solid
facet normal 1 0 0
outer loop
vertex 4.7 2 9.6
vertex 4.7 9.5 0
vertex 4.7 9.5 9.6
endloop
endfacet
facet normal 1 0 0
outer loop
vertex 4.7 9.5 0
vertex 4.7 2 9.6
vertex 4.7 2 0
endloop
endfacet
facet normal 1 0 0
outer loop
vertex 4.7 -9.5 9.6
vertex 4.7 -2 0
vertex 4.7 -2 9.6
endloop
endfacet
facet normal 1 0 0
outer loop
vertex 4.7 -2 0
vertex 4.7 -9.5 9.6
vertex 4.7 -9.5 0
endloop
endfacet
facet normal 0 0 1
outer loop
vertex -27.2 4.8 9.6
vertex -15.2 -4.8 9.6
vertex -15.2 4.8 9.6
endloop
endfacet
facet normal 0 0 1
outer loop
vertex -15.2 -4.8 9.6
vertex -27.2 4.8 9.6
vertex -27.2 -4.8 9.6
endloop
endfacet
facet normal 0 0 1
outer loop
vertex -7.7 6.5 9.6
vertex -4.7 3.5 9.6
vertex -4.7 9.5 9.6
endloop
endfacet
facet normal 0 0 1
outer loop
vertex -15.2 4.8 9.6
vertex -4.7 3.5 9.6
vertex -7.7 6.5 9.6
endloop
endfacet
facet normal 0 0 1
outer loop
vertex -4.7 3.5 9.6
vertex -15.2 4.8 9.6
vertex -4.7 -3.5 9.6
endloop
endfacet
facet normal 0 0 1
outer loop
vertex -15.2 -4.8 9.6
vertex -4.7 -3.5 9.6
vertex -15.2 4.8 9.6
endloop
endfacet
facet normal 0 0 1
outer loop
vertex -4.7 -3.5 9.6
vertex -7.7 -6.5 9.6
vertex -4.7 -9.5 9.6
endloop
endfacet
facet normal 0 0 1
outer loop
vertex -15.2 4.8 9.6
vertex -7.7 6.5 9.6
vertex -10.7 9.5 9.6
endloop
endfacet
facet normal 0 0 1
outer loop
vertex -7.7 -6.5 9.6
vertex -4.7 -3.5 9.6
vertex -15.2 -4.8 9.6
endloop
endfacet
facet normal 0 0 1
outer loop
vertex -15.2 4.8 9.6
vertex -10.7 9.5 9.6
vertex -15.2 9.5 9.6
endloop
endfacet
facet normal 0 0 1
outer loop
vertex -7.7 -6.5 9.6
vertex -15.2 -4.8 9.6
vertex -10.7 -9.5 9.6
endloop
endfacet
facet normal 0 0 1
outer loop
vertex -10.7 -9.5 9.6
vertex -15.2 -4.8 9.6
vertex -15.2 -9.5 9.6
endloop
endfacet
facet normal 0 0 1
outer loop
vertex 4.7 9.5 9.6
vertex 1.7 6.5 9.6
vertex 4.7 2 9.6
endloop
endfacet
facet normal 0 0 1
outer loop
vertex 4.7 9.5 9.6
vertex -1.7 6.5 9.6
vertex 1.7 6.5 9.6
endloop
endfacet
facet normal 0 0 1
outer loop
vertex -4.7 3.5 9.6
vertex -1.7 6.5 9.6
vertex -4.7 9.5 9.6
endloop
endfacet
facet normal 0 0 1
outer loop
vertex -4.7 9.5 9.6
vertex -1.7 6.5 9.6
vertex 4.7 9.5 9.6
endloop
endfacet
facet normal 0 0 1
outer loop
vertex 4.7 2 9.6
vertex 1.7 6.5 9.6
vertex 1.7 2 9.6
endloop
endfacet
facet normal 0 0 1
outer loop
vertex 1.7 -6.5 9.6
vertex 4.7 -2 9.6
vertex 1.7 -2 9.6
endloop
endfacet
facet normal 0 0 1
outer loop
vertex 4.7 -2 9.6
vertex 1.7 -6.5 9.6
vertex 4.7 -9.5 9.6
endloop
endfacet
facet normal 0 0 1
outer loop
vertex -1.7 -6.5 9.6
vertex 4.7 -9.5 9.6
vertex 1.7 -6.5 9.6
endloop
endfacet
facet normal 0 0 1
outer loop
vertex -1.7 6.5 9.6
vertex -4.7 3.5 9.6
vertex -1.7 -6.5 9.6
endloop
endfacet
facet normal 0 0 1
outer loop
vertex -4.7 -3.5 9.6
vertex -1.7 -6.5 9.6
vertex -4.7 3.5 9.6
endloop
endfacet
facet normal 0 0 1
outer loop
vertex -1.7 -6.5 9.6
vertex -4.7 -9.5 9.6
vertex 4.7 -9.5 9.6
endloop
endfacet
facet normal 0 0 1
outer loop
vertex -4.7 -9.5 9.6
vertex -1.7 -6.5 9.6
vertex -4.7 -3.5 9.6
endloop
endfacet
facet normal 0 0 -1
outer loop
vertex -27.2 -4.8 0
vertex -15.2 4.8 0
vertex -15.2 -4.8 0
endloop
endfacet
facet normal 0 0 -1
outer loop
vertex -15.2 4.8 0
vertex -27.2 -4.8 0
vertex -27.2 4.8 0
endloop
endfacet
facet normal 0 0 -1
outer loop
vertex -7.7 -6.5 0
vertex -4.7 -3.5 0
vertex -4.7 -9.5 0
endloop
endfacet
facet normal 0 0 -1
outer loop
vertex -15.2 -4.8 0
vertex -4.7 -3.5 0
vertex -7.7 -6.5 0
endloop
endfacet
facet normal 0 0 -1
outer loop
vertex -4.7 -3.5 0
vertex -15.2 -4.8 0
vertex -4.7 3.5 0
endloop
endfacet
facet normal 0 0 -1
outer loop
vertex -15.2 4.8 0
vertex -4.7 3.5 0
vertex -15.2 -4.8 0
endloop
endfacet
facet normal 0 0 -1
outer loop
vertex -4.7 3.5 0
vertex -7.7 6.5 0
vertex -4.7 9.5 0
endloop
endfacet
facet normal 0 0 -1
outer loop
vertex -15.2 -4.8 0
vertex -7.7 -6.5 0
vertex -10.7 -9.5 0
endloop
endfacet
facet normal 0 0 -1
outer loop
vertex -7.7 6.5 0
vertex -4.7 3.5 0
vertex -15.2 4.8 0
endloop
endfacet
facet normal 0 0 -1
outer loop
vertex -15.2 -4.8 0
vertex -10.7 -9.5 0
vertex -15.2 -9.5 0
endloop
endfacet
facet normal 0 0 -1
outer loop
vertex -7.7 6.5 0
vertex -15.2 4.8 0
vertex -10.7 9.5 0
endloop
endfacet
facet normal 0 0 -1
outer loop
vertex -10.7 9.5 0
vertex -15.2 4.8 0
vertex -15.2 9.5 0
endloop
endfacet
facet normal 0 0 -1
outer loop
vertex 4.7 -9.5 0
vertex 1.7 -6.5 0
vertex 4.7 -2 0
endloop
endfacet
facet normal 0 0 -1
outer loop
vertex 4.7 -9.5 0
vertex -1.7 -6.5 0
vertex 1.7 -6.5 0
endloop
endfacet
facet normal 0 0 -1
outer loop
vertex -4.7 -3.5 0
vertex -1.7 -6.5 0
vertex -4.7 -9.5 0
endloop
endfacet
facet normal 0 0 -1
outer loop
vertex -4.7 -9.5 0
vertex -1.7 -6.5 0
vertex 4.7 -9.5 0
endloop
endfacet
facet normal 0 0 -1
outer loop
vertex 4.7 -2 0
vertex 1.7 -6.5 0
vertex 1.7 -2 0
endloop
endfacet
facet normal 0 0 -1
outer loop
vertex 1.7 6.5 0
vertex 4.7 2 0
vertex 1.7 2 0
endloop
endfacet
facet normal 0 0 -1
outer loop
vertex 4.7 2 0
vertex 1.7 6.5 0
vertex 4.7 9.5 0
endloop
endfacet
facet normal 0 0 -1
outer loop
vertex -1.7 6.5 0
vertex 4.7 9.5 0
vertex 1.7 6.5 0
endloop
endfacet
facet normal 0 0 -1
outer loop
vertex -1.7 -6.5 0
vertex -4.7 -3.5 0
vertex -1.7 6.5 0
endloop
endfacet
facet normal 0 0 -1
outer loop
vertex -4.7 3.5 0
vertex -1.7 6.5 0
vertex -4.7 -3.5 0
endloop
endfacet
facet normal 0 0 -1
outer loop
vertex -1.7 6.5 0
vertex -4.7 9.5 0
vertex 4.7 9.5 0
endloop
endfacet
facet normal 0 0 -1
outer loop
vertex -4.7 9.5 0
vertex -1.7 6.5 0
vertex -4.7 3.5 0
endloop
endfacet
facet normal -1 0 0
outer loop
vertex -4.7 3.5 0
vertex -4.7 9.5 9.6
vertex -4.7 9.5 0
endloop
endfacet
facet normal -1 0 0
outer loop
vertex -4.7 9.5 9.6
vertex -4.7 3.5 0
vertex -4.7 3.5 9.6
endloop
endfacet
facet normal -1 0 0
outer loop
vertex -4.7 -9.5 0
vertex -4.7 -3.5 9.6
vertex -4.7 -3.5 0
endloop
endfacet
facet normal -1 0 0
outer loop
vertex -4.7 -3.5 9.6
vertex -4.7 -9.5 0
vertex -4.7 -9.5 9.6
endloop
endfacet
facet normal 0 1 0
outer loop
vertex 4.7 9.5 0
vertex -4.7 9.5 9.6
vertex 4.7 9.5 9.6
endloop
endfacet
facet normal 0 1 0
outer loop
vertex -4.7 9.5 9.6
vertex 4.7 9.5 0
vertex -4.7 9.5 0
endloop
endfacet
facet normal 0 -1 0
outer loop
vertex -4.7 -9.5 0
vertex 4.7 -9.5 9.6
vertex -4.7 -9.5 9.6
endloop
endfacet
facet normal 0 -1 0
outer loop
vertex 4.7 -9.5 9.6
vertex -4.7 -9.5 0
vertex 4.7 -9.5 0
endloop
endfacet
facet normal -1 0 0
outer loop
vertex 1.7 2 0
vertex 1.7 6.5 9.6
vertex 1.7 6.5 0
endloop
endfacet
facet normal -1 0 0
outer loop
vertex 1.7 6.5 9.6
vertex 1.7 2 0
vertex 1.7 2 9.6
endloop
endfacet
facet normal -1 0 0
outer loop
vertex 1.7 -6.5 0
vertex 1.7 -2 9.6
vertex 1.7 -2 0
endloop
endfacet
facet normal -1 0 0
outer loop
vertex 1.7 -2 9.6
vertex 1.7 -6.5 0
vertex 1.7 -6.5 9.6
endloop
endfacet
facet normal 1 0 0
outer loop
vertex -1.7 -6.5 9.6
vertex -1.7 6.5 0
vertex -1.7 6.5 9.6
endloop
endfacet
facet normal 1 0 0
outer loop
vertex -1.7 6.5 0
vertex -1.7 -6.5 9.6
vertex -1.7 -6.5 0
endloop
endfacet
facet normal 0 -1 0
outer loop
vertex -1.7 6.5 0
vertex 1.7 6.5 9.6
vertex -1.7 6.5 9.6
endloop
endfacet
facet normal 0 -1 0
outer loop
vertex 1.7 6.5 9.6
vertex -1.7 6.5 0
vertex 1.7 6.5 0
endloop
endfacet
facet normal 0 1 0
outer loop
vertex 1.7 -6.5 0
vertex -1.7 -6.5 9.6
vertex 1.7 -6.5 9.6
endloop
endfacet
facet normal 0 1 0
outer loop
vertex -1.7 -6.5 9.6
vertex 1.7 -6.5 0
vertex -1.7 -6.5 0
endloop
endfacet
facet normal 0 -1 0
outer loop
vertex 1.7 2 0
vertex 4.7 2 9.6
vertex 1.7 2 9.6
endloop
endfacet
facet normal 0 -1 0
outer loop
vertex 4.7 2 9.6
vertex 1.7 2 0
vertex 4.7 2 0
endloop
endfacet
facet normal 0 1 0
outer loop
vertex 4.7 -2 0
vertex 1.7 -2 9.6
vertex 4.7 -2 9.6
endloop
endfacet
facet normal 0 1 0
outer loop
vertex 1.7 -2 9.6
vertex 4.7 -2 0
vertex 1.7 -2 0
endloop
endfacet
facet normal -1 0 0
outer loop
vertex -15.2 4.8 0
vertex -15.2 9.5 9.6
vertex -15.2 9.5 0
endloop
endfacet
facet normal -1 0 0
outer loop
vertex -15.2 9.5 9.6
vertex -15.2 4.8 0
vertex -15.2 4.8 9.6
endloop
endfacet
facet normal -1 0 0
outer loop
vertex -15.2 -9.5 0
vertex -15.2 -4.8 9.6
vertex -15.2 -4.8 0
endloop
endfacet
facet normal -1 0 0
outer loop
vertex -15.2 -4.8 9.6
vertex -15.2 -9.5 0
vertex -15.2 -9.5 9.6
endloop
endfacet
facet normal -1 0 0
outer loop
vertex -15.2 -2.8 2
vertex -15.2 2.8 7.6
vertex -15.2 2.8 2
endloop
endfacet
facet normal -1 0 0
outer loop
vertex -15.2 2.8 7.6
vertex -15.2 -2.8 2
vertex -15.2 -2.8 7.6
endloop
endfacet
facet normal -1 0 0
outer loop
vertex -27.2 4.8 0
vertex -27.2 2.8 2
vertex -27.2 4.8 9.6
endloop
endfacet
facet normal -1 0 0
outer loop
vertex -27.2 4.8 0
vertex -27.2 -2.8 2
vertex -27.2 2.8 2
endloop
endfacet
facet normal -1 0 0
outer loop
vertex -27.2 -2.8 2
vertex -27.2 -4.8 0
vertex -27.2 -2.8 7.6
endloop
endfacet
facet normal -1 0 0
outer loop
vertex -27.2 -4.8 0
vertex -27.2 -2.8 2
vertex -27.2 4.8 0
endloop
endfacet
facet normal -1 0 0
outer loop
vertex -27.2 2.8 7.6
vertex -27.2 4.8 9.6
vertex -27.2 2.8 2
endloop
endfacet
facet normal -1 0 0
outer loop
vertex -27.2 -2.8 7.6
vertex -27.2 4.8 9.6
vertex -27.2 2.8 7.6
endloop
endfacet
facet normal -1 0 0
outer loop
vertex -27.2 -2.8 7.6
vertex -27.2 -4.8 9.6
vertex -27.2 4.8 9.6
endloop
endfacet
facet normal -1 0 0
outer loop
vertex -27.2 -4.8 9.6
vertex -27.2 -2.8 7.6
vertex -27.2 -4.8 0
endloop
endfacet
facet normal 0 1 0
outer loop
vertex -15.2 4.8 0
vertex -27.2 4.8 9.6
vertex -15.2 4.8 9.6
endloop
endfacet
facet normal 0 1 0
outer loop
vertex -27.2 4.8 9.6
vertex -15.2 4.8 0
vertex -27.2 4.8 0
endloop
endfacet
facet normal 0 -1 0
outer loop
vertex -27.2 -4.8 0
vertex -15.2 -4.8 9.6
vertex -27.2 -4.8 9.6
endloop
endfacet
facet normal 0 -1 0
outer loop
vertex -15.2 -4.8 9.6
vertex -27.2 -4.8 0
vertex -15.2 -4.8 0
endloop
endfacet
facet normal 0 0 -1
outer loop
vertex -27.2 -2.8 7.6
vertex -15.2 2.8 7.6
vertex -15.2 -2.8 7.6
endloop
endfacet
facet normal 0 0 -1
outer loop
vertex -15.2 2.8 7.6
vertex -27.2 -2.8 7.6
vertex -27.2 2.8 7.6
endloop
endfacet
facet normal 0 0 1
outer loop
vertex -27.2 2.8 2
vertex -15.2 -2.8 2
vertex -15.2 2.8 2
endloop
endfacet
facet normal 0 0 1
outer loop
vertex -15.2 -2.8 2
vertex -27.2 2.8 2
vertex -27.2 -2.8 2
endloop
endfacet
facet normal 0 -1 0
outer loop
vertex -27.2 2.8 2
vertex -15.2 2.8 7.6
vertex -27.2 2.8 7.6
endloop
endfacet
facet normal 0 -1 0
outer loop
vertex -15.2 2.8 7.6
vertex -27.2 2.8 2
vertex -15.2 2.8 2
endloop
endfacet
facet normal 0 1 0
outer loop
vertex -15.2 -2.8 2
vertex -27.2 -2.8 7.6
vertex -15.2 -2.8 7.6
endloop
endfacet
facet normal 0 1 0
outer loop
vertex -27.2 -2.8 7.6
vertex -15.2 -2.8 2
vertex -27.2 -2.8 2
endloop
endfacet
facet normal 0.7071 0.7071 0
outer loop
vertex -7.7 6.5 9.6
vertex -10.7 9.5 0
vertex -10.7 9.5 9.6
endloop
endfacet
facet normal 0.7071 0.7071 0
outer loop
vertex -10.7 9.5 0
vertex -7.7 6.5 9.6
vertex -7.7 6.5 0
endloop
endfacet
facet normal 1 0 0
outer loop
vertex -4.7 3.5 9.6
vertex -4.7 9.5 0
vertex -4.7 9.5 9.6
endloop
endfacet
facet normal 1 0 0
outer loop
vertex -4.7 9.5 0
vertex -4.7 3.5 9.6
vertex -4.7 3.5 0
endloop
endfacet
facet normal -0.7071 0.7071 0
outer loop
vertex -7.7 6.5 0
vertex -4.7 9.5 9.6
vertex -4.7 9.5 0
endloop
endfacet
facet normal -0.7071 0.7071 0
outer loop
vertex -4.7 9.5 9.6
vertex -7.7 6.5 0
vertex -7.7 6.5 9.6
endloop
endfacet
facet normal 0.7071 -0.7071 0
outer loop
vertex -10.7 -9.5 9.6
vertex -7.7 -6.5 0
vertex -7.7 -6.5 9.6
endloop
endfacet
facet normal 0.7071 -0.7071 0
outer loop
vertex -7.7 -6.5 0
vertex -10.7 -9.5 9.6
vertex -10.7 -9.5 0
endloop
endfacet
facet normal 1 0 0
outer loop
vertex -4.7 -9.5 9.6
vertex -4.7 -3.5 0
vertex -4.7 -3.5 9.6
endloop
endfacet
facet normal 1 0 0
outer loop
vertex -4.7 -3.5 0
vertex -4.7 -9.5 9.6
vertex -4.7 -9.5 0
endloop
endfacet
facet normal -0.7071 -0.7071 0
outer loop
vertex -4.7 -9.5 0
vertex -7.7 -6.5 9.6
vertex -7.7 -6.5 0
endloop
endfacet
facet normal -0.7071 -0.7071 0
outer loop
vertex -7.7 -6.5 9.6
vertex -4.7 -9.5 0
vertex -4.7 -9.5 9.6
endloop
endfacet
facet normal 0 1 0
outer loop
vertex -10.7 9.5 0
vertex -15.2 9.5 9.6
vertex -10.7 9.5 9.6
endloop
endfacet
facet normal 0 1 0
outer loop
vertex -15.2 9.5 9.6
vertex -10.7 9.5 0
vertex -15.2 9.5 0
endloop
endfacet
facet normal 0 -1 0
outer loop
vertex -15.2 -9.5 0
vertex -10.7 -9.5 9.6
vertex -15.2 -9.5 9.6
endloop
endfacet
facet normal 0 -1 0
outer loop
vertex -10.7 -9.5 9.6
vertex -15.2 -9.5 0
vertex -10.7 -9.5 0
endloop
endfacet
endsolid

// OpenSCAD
// ----------------------------------------------------------------
// Customizable Socket Organizers: Rail (Rectangular Cross Section)
// ----------------------------------------------------------------
//
// Zemba Craftworks
// youtube.com/zembacraftworks
// thingiverse.com/zembacraftworks/about

// This is a configurable, 3D printable insert designed to
// slide onto a metal or wooden bar to create socket set
// organizers. Dimensions can be adjusted for sockets of
// all sizes and to slide onto bars/holders of any size.

// Date Created:  2018-07-30
// Last Modified: 2018-12-19

// Critical Dimensions
// -------------------
// Adjust these dimensions and verify them with a test print
// before printing holders for all of your sockets! You want a
// snug fit but not so tight that anything gets stuck. These
// values will vary depending on your sockets, the rail you're
// using, and the calibration of your printer.

d  = 9.6;           // Socket Drive Width (mm)
                    // (9.6 = approximately 3/8 in * 25.4 mm/in)

dh = 12;            // Socket Drive Height (mm)
                    // May or may not be limited by the design
                    // of your sockets
                    
rx = 3.4;           // Rail Cross-Section Height (mm)
                    // (3.4 = approximately 1/8 in * 25.4 mm/in)
                    
ry = 13;            // Rail Cross-Section Width (mm)
                    // (13 = approximately 1/2 in * 25.4 mm/in)
                    
// Other Dimensions 
// ----------------
// These dimensions are not as critical to the fit, but can be
// adjusted to suit your preferences.

dw = 2;             // Drive Wall Thickness (mm)
                    // Set to d/2 to make the drive post solid
ds = 5.5;           // Drive Stand Width (mm)
                    // (region between clamp and flange)
ct = 3;             // Wall Thickness of Rail Clamp (mm)
ch = d;             // Height of Rail Clamp (mm)
                    // (generally ch = d)                    
cg = 4;             // Bottom Gap of Rail Clamp (mm)
                    // (adds some flex when attaching to rail)
fa = 6;             // Flange Height above Rail Clamp (mm)
fc = 6.75;             // Flange Chamfer Width (mm)
fw = ry+2*ct;       // Flange Width (mm)
                    // (fw = ry+2*ct = flush with clamp)
ft = 1.5*ct;        // Flange Thickness (mm)

// Nub Dimensions (Optional)
// ------------------
// This imitates the spring-loaded bearing on the socket wrench which
// mates to the internal notch or side hole of the socket. However,
// you may have better success without it. Depending on your print
// it may snap off or deform easily when inserting into the socket.

enableNub = false;  // Enable Nub for Socket
nw = 3;             // Nub Width (mm)
nt = 0.5;           // Nub Height (mm)
nh = 5.5;           // Nub Distance from Flange (mm)
nr = 0.49;          // Radius of Curved Nub Edge (must be <= nt)
fn1 = 20;           // Number of Facets for Nub Curvature 

// Tolerance Value
// ---------------
// When shapes are subtracted through difference() in
// OpenSCAD, there is ambiguity if any faces of the two shapes
// occupy the same space. Adding a small value 't' to make
// the subtracted shape slightly larger prevents this.

t = 0.1;

// Create Socket Organizer:
union(){
    
    // Rail Clamp
    difference(){
        // Rail Clamp Full Area
        translate([-(rx+2*ct)/2, -(ry+2*ct)/2, 0]){
            cube([rx + 2*ct, ry + 2*ct, ch]);    }    
        // Rail Cross Section
        translate([-rx/2, -ry/2, -t/2]){
            cube([rx, ry, ch+t]);    }    
        // Rail Clamp Gap
        translate([rx/2-t/2, -cg/2, -t/2]){
            cube([ct+t, cg, ch+t]);}}

    // Socket Drive
    difference(){    
        // Socket Drive Exterior
        translate([-dh-rx/2-ct-fa-ft,-d/2,0]){
            cube([dh,d,d]);}
        // Socket Drive Interior
        translate([-dh-rx/2-ct-fa-ft-t/2,-(d-2*dw)/2,dw]){
            cube([dh+t,d-2*dw,d-2*dw]);}}

    // Socket Drive Flange
    translate([-rx/2-ct-ft-fa,-fw/2,0]){
        cube([ft,fw,d]);    }

    // Socket Drive Support
    translate([-rx/2-ct-fa,-ds/2,0]){
        cube([fa,ds,d]);}

    // Create Nub (Optional)
    // (+0.0001 ensures cube is not height 0 when nt = nr)
    if (enableNub){
        translate([nr-nw-rx/2-ct-fa-ft-nh,nr-nw/2,nr-nt+d]){
            difference(){
                minkowski(){
                    sphere(r=nr,$fn=fn1);
                    cube([nw-2*nr,nw-2*nr,2*nt-2*nr+0.0001]);}
                translate([-nr,-nr,-nr]){
                    cube([nw,nw,nt]);}}}}

    // Chamfers
    translate([-rx/2-ct-fa,ds/2,0]){
        chamfer(fc,d,t);}
    translate([-rx/2-ct,ds/2,0]){
        rotate([0,0,90]){    
            chamfer(fc,d,t);}}
    translate([-rx/2-ct-fa,-ds/2,0]){
        rotate([0,0,-90]){    
            chamfer(fc,d,t);}}
    translate([-rx/2-ct,-ds/2,0]){
        rotate([0,0,-180]){    
            chamfer(fc,d,t);}}
}


// Chamfer Module
// Creates an interior chamfered edge w x w x h
module chamfer(w,h,t){
    hyp = sqrt(pow(w,2)+pow(w,2)); // Hypotenuse Distance
    difference(){
    cube([w,w,h]);
    translate([w,0,-t/2]){
        rotate([0,0,45]){
            cube([hyp,hyp,h+t]);}}}}
